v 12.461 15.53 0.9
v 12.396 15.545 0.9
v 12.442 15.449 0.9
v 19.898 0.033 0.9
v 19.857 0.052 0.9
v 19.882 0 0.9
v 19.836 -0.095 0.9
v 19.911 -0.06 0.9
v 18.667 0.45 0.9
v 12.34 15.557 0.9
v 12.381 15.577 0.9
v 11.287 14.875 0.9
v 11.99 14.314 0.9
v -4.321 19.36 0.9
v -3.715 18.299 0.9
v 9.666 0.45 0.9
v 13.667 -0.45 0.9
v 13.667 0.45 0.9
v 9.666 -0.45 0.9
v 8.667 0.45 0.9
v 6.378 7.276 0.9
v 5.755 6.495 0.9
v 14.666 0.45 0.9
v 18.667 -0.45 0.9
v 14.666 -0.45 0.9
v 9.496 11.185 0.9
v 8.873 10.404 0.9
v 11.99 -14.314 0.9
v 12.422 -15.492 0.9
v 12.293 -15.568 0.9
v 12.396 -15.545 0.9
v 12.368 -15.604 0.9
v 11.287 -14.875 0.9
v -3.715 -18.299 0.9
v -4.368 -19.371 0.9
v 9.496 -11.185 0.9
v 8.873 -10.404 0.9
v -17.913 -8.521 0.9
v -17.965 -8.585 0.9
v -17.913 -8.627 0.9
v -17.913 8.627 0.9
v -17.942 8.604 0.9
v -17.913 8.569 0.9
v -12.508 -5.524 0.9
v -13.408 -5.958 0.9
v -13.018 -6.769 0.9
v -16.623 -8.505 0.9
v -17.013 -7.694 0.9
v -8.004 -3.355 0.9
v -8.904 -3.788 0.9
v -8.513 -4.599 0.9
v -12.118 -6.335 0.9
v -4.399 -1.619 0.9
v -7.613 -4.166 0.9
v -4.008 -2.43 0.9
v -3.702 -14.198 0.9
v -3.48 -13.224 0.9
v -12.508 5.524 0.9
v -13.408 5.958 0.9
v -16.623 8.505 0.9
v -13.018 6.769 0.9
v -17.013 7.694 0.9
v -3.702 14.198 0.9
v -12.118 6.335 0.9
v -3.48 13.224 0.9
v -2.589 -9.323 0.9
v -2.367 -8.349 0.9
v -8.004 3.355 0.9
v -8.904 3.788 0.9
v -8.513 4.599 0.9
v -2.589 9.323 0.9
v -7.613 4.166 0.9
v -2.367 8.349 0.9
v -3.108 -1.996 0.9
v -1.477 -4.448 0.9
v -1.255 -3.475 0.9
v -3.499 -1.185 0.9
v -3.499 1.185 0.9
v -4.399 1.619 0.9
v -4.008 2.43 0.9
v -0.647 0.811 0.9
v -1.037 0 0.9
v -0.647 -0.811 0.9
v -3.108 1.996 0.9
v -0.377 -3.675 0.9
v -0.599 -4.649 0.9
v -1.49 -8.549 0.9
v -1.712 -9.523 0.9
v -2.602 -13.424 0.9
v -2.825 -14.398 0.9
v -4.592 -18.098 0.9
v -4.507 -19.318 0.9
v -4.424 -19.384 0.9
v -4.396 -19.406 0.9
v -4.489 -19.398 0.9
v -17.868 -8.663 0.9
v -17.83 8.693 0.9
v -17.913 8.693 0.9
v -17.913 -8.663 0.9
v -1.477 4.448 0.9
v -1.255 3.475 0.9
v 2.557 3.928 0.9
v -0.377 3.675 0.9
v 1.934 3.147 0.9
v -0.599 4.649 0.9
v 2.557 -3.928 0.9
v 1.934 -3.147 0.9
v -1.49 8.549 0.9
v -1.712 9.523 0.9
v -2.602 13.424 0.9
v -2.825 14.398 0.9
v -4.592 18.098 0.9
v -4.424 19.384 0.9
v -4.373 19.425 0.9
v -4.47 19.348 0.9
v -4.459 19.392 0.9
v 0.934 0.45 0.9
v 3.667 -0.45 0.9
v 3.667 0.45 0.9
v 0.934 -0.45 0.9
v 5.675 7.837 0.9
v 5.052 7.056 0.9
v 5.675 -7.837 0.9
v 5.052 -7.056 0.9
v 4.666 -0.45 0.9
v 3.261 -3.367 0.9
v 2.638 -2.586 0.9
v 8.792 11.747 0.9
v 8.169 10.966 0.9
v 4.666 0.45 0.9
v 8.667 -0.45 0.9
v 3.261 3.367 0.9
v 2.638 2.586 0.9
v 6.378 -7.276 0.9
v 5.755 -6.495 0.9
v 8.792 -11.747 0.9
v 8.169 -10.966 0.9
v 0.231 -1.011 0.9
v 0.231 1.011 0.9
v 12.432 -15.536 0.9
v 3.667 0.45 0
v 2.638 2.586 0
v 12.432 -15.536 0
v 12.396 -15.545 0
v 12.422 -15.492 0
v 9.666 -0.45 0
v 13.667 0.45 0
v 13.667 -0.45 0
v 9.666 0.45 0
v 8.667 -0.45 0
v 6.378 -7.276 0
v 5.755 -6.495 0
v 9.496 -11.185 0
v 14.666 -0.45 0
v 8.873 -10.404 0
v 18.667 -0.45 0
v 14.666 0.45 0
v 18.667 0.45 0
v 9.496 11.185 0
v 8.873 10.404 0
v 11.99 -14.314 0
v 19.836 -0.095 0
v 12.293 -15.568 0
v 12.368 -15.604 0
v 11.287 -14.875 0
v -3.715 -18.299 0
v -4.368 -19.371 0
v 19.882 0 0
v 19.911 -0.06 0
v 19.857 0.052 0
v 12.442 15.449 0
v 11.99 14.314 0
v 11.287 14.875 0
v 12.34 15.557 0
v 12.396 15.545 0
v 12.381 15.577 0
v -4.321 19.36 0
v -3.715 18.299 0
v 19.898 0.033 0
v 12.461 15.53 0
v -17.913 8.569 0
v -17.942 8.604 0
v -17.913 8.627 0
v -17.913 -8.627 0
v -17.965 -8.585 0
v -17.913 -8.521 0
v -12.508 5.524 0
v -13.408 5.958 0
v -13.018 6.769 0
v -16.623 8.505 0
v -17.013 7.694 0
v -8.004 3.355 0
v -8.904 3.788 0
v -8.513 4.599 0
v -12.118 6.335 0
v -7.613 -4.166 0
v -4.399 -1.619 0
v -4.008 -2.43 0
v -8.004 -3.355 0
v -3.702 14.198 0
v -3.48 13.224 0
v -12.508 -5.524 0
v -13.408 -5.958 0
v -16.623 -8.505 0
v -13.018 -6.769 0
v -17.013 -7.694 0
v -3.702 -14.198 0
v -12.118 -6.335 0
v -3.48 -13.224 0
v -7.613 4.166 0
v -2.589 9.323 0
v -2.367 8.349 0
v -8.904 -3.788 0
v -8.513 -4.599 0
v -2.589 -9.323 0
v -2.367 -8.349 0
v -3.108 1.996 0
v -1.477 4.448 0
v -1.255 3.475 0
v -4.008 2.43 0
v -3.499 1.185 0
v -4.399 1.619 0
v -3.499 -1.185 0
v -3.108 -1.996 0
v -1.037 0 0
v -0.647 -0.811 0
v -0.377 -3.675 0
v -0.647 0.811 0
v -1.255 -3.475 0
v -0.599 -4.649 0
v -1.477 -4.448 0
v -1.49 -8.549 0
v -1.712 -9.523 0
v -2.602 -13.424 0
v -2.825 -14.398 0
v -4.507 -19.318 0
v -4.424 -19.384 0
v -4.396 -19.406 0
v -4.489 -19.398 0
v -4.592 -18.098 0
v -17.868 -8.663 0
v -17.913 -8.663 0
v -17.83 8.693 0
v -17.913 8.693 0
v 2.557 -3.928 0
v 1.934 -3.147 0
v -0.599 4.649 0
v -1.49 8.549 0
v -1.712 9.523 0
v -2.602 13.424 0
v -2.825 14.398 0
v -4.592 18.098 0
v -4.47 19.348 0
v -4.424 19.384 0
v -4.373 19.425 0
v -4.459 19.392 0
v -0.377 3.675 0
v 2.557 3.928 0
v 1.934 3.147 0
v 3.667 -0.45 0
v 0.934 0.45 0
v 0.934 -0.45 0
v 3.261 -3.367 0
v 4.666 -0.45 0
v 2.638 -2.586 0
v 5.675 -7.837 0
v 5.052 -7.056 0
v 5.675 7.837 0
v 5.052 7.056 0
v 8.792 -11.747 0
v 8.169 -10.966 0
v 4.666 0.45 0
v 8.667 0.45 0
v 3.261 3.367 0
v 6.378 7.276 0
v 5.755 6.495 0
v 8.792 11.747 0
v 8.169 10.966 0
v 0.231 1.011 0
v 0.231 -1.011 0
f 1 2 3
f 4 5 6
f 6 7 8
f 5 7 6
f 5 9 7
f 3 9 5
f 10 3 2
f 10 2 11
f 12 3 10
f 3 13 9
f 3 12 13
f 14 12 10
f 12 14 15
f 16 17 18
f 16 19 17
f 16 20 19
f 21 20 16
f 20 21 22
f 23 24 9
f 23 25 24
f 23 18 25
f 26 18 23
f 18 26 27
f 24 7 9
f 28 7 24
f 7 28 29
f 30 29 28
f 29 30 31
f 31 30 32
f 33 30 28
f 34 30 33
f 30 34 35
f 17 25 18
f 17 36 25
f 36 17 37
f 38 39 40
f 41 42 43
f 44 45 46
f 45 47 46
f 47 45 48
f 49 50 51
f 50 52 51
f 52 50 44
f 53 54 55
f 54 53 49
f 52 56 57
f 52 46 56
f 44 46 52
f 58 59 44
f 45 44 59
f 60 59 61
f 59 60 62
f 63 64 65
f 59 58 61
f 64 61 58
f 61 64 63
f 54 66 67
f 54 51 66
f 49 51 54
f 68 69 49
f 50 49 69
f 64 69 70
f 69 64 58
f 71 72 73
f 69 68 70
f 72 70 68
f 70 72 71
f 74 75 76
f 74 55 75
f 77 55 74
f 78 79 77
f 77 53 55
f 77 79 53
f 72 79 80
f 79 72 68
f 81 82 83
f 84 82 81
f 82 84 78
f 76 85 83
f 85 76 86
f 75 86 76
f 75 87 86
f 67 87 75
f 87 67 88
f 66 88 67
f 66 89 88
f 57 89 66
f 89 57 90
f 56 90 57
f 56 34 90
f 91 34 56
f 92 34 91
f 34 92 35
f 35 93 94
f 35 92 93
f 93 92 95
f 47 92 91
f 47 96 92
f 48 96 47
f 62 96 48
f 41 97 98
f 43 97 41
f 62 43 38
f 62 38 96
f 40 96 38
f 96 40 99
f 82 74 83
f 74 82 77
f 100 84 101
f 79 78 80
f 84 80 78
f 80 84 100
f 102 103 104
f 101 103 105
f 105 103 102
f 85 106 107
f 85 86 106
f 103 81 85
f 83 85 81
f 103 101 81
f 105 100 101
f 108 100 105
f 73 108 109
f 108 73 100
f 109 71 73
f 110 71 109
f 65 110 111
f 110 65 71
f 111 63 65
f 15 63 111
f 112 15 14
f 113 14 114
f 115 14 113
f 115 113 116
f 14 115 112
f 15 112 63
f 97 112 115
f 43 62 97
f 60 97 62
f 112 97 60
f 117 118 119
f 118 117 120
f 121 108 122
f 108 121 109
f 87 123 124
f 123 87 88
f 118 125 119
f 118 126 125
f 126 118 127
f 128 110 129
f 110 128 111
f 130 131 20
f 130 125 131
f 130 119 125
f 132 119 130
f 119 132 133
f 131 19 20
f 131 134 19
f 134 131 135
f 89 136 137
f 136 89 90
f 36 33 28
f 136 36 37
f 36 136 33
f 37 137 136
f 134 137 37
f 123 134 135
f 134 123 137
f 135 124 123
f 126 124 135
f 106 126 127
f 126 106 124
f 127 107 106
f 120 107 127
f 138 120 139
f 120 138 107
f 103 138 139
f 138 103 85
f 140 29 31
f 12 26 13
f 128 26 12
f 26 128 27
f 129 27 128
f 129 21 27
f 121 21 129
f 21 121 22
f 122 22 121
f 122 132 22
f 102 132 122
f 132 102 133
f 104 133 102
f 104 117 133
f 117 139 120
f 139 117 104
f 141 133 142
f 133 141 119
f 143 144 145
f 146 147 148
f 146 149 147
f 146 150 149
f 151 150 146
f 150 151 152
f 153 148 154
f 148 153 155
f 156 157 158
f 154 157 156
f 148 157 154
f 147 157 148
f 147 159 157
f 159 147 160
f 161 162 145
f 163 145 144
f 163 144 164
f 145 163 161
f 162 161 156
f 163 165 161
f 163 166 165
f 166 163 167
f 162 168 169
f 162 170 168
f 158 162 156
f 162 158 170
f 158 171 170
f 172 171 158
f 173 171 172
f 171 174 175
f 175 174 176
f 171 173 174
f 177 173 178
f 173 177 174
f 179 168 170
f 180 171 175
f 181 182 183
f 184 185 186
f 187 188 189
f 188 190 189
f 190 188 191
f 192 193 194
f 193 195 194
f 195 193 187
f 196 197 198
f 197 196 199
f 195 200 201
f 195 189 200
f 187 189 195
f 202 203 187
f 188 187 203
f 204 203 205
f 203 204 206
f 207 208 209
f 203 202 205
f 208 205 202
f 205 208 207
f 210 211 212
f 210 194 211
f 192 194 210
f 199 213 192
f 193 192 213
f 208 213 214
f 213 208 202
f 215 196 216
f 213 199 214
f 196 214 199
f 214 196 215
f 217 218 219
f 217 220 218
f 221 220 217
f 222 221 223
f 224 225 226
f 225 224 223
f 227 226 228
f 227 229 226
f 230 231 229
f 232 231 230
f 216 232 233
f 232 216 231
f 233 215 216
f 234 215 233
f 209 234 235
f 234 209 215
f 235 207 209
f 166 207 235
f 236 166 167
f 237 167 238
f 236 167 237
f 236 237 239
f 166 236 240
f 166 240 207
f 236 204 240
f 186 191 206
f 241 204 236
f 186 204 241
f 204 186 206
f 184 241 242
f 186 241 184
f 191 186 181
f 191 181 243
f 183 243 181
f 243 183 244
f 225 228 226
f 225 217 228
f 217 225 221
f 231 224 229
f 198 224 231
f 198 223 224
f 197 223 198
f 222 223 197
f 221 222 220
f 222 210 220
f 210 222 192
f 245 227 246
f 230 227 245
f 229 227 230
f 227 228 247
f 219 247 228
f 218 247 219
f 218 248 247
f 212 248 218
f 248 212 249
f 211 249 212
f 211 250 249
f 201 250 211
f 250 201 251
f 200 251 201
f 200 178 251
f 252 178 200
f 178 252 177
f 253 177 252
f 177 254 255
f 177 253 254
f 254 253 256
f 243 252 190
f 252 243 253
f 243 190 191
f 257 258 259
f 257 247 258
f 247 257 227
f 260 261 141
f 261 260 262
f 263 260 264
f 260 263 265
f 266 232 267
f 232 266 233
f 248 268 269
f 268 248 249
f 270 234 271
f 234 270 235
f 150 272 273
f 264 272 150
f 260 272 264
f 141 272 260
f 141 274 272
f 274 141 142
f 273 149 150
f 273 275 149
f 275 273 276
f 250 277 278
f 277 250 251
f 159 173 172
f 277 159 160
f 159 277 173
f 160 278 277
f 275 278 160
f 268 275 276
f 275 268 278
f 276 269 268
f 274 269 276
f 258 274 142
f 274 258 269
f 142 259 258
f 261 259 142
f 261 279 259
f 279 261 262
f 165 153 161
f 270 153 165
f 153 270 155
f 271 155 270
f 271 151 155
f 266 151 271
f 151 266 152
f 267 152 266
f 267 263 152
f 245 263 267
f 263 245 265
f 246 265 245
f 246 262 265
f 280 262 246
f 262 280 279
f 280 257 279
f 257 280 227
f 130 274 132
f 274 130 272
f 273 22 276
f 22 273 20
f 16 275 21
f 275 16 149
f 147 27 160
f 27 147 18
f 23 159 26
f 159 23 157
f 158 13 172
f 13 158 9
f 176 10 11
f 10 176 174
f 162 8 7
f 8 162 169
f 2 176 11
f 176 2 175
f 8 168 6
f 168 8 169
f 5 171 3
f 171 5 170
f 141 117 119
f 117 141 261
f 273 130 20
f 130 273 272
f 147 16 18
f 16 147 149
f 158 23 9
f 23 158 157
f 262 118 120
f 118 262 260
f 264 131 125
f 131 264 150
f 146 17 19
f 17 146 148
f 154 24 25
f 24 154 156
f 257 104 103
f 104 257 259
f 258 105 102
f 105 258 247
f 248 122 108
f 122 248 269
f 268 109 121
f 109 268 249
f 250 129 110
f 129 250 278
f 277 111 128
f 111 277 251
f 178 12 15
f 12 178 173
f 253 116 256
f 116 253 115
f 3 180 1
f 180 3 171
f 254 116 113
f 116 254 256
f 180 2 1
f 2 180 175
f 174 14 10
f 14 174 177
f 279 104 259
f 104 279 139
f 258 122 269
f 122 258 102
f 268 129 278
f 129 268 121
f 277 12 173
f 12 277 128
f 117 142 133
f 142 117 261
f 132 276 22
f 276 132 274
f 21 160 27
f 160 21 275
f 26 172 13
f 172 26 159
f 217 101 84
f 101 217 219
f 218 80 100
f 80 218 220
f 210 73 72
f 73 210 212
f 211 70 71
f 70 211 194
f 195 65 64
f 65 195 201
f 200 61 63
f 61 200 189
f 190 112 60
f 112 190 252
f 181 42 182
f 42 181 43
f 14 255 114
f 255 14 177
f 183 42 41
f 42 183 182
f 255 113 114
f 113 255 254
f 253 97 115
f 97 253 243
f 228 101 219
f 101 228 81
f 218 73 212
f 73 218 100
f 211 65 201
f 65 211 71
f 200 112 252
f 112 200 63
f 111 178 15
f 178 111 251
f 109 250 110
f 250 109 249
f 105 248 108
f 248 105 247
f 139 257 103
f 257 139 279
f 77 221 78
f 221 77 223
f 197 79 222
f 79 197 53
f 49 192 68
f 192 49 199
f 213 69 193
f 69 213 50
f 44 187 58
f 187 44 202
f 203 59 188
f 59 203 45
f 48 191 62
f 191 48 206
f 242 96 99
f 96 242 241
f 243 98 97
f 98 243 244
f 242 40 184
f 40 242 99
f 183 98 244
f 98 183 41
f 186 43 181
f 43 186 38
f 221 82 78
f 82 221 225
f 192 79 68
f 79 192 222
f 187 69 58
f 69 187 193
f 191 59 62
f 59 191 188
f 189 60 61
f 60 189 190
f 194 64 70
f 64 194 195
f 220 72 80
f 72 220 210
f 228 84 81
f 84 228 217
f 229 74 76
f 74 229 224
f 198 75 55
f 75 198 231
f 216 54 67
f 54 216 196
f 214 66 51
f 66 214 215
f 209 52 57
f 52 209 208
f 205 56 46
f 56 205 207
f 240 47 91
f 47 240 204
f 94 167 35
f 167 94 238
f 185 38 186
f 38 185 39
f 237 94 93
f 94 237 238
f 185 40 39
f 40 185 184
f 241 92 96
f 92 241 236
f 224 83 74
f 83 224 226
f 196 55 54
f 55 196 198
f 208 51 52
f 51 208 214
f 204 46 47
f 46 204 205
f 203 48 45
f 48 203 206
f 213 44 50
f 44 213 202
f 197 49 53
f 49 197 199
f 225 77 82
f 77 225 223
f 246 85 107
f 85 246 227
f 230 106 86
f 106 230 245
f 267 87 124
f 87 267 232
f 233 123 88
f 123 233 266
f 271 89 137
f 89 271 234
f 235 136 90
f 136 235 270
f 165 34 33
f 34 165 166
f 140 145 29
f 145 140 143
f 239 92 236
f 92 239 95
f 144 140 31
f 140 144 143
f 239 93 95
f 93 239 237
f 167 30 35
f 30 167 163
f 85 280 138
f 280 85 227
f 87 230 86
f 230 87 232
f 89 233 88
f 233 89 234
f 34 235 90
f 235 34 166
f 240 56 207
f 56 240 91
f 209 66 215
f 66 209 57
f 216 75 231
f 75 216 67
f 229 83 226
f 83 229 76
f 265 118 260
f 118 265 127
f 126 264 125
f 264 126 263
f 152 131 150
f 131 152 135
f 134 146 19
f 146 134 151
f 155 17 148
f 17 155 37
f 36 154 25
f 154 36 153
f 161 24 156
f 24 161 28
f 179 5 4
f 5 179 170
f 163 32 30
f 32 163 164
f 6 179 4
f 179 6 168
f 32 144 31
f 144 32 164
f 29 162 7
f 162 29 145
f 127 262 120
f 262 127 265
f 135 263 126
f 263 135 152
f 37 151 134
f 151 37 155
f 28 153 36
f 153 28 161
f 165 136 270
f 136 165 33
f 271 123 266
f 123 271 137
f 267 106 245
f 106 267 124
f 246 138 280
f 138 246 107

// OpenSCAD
module web(prongs, stakes, line_width, radius, height) {
	riblength = 2 * radius * sin(180 / prongs);
	for(prong = [0:prongs]) {
		rotate([0, 0, prong / prongs * 360]) {
			translate([-line_width / 2, -line_width / 2, 0]) {
				cube([radius, line_width, height]);
				for(stake = [1:stakes]) {
					translate([radius * stake / stakes - line_width / 2, 0, 0]) {
						rotate([0, 0, 180 / prongs]) {
							cube([line_width, riblength * stake / stakes, height]);
						}
					}
				}
			}
		}
	}
}

//web(prongs=7, stakes=4, line_width=0.5, radius=20);
web(prongs=7, stakes=4, line_width=0.9, radius=20, height = 0.9);
